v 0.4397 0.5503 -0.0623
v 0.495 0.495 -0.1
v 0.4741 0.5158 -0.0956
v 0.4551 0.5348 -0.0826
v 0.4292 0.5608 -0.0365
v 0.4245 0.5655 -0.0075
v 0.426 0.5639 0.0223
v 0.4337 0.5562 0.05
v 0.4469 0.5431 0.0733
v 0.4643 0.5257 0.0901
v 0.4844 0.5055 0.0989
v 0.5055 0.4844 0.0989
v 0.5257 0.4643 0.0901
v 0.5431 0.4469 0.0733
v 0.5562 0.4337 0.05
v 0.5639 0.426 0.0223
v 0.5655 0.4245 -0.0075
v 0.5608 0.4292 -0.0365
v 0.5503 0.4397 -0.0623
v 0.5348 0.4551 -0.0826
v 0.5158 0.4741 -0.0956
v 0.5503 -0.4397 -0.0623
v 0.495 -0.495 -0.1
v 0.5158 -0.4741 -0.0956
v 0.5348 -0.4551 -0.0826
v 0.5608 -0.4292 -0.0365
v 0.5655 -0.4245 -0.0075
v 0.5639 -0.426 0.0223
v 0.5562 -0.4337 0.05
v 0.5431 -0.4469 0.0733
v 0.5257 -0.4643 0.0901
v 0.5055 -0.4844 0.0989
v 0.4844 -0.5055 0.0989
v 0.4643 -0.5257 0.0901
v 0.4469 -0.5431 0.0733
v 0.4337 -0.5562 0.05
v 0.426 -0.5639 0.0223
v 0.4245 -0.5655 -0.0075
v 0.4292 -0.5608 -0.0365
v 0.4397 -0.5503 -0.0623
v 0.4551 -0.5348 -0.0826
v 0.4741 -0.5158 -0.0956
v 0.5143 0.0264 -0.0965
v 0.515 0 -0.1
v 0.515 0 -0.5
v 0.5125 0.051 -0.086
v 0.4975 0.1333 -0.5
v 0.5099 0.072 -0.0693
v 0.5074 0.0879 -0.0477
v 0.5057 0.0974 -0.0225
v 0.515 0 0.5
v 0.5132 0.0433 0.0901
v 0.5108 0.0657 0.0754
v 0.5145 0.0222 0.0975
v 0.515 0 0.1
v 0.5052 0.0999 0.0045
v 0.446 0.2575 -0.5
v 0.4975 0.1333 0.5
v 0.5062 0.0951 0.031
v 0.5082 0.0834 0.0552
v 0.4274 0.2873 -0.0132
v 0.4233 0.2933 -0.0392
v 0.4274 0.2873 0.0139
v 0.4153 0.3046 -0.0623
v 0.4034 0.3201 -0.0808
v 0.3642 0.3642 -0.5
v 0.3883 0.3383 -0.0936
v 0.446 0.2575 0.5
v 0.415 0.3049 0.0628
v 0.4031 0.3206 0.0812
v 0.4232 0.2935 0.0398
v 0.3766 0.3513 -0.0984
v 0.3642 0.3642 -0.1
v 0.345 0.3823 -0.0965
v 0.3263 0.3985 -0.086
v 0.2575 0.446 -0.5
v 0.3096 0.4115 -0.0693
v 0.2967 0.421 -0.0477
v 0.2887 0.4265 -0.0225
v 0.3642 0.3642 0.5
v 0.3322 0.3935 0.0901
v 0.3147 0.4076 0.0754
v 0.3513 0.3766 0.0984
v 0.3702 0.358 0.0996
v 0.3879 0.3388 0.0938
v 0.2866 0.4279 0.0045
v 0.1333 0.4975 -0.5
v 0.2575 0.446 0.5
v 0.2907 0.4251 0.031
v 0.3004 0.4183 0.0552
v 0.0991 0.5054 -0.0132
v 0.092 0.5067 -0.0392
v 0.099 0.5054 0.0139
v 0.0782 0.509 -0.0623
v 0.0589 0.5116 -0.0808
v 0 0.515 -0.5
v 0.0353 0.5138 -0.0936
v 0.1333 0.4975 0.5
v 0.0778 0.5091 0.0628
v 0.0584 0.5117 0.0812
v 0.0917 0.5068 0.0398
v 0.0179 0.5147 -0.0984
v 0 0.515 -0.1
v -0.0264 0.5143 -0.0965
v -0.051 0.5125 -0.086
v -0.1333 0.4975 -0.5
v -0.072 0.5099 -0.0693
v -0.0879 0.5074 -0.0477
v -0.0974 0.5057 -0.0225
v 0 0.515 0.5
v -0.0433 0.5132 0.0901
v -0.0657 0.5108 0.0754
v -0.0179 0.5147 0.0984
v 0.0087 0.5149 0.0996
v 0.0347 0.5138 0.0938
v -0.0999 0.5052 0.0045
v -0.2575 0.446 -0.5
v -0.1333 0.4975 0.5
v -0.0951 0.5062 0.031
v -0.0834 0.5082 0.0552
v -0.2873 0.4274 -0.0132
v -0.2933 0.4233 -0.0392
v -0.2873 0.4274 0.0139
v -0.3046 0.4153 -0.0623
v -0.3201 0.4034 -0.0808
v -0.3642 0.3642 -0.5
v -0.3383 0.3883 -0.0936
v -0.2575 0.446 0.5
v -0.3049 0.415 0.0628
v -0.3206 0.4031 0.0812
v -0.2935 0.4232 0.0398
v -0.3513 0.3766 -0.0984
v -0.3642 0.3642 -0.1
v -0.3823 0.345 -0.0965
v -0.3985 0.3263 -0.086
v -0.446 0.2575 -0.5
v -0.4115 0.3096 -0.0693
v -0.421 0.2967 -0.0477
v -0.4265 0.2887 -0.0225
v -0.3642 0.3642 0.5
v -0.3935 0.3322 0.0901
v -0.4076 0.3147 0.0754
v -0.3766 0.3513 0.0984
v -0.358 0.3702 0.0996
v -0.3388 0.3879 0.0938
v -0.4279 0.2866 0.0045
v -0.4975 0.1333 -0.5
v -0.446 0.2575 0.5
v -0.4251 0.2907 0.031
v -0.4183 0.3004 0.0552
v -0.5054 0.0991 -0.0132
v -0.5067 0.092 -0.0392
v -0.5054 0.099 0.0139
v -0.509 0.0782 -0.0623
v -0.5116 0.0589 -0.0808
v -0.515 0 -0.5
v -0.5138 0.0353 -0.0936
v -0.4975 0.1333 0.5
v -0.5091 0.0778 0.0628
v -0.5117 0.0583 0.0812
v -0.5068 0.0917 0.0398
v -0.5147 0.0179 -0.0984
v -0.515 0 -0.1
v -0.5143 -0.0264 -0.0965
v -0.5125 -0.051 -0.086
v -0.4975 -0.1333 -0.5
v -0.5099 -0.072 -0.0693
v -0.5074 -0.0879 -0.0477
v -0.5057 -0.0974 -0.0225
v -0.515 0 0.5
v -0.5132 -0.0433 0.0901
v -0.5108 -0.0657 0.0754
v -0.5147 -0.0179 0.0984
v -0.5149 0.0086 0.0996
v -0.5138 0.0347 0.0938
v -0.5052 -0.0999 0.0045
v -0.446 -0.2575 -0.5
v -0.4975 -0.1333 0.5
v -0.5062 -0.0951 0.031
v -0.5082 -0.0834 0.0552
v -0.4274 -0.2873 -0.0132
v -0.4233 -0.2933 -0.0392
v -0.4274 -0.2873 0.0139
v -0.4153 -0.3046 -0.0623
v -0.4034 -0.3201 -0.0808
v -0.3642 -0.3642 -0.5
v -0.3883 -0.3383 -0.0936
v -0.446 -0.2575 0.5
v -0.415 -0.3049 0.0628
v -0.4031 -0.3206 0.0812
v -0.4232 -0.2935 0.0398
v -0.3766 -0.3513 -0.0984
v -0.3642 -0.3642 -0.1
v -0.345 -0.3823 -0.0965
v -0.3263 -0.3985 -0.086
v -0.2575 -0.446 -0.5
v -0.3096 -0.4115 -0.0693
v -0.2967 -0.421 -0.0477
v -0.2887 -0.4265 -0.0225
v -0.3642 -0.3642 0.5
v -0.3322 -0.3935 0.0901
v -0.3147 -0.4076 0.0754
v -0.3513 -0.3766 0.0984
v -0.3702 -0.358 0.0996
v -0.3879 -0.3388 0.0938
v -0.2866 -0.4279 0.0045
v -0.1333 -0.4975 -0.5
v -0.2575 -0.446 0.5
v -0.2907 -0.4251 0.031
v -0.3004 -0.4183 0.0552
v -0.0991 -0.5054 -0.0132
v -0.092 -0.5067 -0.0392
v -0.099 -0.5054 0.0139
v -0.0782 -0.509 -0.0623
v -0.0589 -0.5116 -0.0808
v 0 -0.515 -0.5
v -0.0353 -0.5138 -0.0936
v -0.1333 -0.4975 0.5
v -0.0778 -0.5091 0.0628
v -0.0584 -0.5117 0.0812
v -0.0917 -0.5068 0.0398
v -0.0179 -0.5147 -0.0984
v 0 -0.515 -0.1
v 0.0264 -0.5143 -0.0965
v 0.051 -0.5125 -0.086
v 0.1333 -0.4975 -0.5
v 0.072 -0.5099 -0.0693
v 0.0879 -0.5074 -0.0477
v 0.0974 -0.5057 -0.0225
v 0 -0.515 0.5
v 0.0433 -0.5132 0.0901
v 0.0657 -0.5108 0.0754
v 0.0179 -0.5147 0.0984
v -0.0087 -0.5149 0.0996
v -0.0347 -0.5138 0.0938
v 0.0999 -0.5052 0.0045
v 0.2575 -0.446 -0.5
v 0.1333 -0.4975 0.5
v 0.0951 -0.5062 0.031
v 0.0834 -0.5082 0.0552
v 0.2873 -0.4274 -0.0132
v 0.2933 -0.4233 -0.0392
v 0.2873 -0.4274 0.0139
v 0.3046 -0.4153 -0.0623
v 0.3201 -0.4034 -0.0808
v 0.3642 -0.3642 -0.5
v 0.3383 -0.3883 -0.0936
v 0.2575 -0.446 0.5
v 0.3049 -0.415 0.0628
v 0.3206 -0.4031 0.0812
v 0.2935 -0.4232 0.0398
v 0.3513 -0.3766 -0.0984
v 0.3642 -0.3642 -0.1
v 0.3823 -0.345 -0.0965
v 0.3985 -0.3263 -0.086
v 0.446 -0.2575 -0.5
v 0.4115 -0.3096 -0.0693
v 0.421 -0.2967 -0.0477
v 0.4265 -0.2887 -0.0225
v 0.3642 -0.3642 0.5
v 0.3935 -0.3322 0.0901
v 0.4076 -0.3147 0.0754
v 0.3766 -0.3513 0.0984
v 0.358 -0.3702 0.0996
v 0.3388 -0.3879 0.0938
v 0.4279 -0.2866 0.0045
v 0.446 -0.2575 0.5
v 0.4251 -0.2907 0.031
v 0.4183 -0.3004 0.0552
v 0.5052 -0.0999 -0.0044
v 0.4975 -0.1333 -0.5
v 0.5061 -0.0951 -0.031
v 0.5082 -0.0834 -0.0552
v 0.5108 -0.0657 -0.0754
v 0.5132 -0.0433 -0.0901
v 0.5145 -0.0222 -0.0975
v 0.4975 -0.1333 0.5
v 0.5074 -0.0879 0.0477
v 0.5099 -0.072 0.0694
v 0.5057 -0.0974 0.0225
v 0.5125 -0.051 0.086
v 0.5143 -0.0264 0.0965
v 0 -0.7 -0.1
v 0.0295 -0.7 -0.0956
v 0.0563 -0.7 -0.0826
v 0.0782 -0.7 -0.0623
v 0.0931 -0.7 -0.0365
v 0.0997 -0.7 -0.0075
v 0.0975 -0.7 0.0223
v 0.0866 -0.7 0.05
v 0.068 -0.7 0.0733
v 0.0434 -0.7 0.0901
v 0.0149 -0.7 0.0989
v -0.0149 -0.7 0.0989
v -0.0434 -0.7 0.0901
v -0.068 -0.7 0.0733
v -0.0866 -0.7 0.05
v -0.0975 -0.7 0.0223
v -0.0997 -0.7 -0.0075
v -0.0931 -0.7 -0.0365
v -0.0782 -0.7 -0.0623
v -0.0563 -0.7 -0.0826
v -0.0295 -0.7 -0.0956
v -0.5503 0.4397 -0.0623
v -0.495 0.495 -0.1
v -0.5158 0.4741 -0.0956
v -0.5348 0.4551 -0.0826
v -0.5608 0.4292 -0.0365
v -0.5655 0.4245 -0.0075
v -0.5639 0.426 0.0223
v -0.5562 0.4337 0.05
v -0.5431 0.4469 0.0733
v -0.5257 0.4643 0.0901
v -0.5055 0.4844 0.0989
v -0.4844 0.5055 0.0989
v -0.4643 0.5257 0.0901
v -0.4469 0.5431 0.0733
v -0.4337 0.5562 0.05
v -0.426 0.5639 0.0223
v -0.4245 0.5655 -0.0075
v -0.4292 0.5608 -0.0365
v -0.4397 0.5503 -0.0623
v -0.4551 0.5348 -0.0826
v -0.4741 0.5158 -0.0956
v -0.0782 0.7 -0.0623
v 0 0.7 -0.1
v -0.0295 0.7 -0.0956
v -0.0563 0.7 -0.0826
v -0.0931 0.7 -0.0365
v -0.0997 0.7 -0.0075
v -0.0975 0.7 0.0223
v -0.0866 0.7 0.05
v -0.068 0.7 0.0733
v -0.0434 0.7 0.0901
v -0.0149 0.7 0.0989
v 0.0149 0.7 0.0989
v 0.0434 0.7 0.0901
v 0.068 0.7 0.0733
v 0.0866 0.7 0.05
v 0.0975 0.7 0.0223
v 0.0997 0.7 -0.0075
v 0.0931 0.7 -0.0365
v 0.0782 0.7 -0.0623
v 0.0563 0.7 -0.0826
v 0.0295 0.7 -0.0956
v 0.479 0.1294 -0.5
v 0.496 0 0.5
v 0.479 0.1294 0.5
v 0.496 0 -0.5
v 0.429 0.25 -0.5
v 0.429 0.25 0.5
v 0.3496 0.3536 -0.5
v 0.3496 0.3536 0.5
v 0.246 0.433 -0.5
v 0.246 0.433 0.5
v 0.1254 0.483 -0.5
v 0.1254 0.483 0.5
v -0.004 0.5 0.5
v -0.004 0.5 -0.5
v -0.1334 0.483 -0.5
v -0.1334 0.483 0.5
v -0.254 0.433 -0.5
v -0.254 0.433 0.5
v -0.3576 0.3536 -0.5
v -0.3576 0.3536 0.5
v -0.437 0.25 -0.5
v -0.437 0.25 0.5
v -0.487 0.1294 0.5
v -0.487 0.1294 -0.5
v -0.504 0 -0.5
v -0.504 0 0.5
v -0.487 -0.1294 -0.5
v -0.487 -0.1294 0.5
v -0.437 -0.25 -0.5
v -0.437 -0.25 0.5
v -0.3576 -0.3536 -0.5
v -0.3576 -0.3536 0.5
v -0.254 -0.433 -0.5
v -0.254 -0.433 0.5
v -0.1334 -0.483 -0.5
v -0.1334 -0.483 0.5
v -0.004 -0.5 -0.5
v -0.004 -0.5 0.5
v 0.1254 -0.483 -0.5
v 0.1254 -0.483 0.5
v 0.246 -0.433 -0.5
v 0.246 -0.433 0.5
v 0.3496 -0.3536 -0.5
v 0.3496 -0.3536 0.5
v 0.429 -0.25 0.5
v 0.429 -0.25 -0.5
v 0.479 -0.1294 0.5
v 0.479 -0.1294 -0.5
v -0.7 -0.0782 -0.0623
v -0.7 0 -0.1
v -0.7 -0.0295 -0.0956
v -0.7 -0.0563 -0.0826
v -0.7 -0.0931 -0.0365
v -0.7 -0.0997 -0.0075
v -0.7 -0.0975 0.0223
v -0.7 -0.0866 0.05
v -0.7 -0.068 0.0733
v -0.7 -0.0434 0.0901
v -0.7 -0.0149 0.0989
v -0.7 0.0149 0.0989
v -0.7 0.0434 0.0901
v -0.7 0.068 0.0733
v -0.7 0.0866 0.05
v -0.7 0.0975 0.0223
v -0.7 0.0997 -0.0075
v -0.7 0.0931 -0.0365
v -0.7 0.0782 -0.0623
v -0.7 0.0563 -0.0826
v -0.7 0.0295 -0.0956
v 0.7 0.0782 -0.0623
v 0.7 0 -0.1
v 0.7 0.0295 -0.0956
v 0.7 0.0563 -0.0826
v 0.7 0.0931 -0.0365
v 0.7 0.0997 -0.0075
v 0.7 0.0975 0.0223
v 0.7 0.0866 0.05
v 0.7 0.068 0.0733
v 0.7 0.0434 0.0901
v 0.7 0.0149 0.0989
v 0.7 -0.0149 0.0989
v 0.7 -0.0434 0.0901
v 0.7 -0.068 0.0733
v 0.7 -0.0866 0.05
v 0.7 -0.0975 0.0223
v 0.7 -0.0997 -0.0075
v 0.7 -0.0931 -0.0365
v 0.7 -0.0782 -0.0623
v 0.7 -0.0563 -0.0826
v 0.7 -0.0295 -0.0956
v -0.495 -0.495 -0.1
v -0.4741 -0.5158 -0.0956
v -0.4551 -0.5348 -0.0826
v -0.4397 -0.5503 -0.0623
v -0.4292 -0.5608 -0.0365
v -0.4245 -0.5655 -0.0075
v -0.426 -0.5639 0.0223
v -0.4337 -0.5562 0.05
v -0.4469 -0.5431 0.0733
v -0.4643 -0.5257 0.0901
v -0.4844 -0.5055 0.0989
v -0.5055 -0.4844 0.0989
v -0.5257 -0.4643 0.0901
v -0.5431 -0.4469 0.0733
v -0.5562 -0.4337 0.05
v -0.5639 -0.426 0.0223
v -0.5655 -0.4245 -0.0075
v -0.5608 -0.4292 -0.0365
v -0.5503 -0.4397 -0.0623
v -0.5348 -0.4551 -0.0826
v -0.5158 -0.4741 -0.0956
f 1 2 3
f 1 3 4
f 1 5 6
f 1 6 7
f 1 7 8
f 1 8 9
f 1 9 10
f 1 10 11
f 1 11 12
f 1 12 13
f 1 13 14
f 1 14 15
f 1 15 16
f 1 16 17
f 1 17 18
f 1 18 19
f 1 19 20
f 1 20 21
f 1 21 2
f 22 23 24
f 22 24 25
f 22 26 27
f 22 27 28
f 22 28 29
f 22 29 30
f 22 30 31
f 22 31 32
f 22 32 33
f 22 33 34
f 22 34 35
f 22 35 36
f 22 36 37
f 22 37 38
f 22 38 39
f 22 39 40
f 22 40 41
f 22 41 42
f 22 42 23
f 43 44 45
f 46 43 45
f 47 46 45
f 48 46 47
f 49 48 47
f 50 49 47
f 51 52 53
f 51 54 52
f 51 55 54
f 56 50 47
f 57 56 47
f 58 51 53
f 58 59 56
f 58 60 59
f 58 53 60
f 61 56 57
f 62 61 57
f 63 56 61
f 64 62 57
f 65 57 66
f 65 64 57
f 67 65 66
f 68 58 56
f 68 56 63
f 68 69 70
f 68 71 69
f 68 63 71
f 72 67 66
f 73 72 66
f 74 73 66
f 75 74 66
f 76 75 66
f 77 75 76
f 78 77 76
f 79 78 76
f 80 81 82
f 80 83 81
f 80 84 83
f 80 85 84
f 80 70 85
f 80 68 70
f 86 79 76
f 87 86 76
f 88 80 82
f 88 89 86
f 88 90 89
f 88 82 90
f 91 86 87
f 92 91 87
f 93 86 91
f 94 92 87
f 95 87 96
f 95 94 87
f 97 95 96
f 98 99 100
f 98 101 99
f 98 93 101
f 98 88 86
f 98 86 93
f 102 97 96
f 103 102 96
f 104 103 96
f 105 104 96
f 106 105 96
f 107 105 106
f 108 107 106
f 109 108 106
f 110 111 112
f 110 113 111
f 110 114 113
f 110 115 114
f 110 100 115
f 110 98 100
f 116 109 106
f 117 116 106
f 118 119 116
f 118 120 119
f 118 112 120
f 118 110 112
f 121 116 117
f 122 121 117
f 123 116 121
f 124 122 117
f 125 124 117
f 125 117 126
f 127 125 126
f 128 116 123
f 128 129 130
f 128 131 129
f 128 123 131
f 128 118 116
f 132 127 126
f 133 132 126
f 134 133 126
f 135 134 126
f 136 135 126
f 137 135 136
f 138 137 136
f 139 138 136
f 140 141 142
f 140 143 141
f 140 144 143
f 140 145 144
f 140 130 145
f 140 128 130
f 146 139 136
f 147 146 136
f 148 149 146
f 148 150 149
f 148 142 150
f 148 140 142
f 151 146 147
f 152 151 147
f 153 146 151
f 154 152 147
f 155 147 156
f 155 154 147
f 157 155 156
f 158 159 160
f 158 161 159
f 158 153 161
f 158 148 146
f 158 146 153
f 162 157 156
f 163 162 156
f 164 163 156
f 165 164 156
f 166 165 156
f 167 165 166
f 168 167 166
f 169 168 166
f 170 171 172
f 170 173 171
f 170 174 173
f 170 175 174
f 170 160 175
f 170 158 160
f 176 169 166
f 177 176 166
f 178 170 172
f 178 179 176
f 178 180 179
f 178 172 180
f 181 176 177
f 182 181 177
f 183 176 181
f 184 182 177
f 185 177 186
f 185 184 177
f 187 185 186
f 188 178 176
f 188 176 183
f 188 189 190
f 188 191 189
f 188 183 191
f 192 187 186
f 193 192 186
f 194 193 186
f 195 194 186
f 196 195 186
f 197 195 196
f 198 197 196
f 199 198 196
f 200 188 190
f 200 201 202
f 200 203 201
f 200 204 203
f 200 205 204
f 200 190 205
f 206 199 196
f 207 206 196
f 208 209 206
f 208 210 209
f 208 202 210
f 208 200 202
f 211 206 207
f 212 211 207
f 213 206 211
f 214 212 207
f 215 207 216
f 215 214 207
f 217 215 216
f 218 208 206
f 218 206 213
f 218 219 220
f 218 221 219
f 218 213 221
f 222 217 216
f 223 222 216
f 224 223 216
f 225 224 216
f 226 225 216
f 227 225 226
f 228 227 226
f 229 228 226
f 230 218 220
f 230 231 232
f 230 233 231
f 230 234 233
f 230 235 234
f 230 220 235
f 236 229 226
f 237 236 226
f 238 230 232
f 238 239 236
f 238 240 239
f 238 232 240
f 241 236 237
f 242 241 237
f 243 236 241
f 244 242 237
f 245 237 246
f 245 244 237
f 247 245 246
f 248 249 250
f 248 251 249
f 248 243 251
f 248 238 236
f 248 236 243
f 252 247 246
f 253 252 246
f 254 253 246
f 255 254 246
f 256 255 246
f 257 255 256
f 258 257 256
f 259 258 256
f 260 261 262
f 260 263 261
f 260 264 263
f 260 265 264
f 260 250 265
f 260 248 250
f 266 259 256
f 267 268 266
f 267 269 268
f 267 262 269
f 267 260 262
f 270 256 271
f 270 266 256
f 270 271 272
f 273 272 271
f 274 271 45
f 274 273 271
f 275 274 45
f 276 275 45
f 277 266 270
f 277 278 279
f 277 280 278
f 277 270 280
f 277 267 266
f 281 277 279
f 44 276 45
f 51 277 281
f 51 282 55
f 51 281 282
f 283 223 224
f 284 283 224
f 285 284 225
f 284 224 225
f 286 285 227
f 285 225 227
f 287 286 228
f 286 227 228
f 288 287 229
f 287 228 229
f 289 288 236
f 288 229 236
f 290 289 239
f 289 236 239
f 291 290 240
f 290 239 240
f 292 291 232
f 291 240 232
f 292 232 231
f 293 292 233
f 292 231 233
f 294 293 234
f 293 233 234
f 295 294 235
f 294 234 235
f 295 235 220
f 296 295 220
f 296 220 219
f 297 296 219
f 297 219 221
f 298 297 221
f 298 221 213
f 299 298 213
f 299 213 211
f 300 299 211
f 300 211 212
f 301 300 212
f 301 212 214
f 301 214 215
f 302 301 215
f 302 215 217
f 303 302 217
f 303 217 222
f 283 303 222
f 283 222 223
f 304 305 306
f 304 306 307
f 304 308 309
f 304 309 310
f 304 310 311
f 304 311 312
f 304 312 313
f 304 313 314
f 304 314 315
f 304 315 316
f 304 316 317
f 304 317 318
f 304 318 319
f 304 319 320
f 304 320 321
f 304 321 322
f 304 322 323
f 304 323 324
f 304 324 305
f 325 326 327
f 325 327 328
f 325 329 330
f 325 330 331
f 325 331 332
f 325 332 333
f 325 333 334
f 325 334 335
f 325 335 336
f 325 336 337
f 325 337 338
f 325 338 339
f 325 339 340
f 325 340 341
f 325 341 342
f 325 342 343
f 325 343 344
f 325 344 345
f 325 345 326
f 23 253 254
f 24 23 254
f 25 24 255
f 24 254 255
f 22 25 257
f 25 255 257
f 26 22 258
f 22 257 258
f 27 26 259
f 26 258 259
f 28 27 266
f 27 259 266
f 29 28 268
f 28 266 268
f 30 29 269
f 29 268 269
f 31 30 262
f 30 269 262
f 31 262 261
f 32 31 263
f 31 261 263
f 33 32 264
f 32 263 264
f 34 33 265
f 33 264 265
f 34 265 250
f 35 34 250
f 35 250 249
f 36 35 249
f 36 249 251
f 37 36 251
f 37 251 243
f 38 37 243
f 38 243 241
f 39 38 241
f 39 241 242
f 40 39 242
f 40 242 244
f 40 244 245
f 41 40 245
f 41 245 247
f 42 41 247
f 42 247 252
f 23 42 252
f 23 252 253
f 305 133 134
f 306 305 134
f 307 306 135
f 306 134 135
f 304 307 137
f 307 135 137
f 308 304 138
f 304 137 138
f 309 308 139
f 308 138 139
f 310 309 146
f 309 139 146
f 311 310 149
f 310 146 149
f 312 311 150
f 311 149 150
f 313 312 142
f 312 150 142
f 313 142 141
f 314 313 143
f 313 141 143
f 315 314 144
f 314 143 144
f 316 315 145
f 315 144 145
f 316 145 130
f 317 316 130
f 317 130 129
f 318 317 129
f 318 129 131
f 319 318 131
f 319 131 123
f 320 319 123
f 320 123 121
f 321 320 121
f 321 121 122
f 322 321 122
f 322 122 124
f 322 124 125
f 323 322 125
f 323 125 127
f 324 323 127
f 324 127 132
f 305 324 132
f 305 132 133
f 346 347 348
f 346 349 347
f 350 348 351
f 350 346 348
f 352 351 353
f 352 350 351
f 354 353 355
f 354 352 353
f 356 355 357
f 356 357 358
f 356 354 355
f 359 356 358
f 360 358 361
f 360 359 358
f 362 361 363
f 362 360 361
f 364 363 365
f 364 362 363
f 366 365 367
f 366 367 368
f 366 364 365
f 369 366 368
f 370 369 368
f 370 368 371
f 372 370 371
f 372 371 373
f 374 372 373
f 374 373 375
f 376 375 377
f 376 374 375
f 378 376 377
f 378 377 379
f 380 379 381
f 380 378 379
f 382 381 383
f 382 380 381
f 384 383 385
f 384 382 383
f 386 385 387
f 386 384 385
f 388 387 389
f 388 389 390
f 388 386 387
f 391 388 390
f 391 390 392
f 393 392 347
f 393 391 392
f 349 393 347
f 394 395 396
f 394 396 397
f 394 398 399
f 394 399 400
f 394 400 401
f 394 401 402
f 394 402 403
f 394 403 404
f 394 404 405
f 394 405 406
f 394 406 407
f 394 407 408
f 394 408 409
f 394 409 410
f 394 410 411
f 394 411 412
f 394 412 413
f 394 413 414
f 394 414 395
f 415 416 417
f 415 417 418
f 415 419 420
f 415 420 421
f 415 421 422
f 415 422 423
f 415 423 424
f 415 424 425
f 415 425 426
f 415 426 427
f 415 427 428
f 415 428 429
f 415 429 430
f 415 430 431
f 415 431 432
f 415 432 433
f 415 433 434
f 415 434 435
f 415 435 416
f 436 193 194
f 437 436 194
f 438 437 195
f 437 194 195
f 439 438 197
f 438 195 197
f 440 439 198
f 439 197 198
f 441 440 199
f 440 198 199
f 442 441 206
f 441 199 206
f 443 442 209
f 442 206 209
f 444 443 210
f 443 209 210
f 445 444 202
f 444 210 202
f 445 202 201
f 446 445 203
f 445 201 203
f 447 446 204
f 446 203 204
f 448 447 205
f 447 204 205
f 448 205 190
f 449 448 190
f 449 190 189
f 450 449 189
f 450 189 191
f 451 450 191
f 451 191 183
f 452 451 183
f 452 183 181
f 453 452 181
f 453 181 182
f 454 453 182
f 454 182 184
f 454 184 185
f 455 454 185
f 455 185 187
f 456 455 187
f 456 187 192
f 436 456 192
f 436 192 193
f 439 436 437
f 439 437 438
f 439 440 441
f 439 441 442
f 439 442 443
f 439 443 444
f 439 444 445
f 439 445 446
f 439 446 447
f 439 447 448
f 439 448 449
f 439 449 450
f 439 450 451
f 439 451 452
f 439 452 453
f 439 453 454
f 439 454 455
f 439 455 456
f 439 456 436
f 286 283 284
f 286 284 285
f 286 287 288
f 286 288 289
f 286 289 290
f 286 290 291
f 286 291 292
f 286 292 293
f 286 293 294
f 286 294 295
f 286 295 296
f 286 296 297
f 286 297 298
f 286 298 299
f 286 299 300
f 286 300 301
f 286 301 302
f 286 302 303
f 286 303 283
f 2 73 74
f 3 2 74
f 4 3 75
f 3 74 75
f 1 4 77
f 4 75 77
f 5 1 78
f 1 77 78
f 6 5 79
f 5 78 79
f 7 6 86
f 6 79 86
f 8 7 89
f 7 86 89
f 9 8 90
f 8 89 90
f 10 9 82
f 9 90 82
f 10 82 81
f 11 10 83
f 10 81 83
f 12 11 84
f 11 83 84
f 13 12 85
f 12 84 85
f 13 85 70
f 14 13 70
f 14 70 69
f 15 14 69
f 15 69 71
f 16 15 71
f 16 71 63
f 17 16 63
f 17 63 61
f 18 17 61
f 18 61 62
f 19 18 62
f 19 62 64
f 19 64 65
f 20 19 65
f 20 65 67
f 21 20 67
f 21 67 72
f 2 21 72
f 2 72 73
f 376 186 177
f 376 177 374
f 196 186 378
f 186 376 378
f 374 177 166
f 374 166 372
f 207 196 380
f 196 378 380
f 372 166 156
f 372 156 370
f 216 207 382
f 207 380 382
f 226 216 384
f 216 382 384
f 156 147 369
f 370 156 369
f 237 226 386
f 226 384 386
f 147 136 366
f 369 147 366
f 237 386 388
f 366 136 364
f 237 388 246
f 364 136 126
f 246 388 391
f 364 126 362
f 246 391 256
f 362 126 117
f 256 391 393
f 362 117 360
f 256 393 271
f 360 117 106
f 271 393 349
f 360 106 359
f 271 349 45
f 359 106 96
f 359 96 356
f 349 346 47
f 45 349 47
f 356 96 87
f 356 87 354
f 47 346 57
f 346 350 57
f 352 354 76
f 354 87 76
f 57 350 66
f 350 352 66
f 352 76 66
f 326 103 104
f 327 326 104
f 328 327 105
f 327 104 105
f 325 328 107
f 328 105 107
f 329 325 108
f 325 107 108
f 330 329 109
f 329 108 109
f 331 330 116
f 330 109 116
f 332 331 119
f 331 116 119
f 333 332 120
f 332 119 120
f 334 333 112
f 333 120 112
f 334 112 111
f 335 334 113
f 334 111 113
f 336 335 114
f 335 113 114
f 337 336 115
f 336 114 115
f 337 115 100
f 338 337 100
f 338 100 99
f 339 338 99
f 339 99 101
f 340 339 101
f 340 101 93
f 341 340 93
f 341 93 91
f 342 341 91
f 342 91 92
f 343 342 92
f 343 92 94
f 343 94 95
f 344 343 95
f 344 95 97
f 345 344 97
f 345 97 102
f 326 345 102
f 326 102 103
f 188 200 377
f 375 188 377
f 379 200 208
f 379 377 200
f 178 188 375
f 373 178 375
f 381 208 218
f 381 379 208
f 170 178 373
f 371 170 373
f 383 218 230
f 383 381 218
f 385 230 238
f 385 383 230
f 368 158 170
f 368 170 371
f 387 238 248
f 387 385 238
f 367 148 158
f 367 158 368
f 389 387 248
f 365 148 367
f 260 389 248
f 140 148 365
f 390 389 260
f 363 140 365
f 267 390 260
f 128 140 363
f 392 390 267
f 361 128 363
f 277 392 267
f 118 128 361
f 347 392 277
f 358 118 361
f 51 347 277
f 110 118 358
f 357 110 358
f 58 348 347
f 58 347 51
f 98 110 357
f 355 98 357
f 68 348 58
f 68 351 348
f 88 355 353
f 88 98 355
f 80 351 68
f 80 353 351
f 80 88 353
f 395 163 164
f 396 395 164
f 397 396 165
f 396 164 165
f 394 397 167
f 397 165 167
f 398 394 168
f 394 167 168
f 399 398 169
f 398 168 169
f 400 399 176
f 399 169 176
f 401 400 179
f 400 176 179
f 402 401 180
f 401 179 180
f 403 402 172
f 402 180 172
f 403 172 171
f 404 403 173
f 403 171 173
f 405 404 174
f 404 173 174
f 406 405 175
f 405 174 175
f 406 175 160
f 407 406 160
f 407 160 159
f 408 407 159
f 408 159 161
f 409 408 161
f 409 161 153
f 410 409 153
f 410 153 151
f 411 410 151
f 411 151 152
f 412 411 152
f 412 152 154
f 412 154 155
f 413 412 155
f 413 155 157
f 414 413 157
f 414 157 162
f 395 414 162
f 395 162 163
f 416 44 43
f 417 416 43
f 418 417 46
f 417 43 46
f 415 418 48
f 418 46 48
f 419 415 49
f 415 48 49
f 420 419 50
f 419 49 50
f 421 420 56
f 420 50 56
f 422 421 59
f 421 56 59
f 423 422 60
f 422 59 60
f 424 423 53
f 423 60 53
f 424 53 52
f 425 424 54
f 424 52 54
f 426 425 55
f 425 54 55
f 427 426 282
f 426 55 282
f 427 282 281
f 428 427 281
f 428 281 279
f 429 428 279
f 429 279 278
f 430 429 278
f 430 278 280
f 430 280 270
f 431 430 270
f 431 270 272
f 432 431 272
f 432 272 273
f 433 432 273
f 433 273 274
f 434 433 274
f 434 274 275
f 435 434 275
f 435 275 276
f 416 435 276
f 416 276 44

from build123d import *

# Parameters (mm, degrees)
SKETCH1_R           = 0.515
SKETCH1_R_2         = 0.5
BOSS_EXTRUDE1_DEPTH = 0.5
BOSS_EXTRUDE2_START = -0.194802
SKETCH2_R           = 0.1
BOSS_EXTRUDE2_DEPTH = 0.194802
CIRPATTERN1_COUNT   = 8


with BuildPart() as part:
    # Sketch1 → Boss-Extrude1 (new body, symmetric)
    with BuildSketch(Plane.XY):
        Circle(SKETCH1_R)
        with Locations((-0.004, 0)):
            Circle(SKETCH1_R_2, mode=Mode.SUBTRACT)
    extrude(amount=BOSS_EXTRUDE1_DEPTH, both=True)

    # Sketch2 → Boss-Extrude2 (add)
    with BuildSketch(Plane(origin=(0.7, 0, 0), x_dir=(0, 0, -1), z_dir=(1, 0, 0)).offset(BOSS_EXTRUDE2_START)):
        Circle(SKETCH2_R)
    boss_extrude2 = extrude(amount=BOSS_EXTRUDE2_DEPTH)

    # CirPattern1: Boss-Extrude2 ×8 about axis
    cirpattern1_axis = Axis((0, 0, 0.5), (0, 0, -1))
    for i in range(1, CIRPATTERN1_COUNT):
        add(boss_extrude2.rotate(cirpattern1_axis, i * 360 / CIRPATTERN1_COUNT))


solid = part.part
